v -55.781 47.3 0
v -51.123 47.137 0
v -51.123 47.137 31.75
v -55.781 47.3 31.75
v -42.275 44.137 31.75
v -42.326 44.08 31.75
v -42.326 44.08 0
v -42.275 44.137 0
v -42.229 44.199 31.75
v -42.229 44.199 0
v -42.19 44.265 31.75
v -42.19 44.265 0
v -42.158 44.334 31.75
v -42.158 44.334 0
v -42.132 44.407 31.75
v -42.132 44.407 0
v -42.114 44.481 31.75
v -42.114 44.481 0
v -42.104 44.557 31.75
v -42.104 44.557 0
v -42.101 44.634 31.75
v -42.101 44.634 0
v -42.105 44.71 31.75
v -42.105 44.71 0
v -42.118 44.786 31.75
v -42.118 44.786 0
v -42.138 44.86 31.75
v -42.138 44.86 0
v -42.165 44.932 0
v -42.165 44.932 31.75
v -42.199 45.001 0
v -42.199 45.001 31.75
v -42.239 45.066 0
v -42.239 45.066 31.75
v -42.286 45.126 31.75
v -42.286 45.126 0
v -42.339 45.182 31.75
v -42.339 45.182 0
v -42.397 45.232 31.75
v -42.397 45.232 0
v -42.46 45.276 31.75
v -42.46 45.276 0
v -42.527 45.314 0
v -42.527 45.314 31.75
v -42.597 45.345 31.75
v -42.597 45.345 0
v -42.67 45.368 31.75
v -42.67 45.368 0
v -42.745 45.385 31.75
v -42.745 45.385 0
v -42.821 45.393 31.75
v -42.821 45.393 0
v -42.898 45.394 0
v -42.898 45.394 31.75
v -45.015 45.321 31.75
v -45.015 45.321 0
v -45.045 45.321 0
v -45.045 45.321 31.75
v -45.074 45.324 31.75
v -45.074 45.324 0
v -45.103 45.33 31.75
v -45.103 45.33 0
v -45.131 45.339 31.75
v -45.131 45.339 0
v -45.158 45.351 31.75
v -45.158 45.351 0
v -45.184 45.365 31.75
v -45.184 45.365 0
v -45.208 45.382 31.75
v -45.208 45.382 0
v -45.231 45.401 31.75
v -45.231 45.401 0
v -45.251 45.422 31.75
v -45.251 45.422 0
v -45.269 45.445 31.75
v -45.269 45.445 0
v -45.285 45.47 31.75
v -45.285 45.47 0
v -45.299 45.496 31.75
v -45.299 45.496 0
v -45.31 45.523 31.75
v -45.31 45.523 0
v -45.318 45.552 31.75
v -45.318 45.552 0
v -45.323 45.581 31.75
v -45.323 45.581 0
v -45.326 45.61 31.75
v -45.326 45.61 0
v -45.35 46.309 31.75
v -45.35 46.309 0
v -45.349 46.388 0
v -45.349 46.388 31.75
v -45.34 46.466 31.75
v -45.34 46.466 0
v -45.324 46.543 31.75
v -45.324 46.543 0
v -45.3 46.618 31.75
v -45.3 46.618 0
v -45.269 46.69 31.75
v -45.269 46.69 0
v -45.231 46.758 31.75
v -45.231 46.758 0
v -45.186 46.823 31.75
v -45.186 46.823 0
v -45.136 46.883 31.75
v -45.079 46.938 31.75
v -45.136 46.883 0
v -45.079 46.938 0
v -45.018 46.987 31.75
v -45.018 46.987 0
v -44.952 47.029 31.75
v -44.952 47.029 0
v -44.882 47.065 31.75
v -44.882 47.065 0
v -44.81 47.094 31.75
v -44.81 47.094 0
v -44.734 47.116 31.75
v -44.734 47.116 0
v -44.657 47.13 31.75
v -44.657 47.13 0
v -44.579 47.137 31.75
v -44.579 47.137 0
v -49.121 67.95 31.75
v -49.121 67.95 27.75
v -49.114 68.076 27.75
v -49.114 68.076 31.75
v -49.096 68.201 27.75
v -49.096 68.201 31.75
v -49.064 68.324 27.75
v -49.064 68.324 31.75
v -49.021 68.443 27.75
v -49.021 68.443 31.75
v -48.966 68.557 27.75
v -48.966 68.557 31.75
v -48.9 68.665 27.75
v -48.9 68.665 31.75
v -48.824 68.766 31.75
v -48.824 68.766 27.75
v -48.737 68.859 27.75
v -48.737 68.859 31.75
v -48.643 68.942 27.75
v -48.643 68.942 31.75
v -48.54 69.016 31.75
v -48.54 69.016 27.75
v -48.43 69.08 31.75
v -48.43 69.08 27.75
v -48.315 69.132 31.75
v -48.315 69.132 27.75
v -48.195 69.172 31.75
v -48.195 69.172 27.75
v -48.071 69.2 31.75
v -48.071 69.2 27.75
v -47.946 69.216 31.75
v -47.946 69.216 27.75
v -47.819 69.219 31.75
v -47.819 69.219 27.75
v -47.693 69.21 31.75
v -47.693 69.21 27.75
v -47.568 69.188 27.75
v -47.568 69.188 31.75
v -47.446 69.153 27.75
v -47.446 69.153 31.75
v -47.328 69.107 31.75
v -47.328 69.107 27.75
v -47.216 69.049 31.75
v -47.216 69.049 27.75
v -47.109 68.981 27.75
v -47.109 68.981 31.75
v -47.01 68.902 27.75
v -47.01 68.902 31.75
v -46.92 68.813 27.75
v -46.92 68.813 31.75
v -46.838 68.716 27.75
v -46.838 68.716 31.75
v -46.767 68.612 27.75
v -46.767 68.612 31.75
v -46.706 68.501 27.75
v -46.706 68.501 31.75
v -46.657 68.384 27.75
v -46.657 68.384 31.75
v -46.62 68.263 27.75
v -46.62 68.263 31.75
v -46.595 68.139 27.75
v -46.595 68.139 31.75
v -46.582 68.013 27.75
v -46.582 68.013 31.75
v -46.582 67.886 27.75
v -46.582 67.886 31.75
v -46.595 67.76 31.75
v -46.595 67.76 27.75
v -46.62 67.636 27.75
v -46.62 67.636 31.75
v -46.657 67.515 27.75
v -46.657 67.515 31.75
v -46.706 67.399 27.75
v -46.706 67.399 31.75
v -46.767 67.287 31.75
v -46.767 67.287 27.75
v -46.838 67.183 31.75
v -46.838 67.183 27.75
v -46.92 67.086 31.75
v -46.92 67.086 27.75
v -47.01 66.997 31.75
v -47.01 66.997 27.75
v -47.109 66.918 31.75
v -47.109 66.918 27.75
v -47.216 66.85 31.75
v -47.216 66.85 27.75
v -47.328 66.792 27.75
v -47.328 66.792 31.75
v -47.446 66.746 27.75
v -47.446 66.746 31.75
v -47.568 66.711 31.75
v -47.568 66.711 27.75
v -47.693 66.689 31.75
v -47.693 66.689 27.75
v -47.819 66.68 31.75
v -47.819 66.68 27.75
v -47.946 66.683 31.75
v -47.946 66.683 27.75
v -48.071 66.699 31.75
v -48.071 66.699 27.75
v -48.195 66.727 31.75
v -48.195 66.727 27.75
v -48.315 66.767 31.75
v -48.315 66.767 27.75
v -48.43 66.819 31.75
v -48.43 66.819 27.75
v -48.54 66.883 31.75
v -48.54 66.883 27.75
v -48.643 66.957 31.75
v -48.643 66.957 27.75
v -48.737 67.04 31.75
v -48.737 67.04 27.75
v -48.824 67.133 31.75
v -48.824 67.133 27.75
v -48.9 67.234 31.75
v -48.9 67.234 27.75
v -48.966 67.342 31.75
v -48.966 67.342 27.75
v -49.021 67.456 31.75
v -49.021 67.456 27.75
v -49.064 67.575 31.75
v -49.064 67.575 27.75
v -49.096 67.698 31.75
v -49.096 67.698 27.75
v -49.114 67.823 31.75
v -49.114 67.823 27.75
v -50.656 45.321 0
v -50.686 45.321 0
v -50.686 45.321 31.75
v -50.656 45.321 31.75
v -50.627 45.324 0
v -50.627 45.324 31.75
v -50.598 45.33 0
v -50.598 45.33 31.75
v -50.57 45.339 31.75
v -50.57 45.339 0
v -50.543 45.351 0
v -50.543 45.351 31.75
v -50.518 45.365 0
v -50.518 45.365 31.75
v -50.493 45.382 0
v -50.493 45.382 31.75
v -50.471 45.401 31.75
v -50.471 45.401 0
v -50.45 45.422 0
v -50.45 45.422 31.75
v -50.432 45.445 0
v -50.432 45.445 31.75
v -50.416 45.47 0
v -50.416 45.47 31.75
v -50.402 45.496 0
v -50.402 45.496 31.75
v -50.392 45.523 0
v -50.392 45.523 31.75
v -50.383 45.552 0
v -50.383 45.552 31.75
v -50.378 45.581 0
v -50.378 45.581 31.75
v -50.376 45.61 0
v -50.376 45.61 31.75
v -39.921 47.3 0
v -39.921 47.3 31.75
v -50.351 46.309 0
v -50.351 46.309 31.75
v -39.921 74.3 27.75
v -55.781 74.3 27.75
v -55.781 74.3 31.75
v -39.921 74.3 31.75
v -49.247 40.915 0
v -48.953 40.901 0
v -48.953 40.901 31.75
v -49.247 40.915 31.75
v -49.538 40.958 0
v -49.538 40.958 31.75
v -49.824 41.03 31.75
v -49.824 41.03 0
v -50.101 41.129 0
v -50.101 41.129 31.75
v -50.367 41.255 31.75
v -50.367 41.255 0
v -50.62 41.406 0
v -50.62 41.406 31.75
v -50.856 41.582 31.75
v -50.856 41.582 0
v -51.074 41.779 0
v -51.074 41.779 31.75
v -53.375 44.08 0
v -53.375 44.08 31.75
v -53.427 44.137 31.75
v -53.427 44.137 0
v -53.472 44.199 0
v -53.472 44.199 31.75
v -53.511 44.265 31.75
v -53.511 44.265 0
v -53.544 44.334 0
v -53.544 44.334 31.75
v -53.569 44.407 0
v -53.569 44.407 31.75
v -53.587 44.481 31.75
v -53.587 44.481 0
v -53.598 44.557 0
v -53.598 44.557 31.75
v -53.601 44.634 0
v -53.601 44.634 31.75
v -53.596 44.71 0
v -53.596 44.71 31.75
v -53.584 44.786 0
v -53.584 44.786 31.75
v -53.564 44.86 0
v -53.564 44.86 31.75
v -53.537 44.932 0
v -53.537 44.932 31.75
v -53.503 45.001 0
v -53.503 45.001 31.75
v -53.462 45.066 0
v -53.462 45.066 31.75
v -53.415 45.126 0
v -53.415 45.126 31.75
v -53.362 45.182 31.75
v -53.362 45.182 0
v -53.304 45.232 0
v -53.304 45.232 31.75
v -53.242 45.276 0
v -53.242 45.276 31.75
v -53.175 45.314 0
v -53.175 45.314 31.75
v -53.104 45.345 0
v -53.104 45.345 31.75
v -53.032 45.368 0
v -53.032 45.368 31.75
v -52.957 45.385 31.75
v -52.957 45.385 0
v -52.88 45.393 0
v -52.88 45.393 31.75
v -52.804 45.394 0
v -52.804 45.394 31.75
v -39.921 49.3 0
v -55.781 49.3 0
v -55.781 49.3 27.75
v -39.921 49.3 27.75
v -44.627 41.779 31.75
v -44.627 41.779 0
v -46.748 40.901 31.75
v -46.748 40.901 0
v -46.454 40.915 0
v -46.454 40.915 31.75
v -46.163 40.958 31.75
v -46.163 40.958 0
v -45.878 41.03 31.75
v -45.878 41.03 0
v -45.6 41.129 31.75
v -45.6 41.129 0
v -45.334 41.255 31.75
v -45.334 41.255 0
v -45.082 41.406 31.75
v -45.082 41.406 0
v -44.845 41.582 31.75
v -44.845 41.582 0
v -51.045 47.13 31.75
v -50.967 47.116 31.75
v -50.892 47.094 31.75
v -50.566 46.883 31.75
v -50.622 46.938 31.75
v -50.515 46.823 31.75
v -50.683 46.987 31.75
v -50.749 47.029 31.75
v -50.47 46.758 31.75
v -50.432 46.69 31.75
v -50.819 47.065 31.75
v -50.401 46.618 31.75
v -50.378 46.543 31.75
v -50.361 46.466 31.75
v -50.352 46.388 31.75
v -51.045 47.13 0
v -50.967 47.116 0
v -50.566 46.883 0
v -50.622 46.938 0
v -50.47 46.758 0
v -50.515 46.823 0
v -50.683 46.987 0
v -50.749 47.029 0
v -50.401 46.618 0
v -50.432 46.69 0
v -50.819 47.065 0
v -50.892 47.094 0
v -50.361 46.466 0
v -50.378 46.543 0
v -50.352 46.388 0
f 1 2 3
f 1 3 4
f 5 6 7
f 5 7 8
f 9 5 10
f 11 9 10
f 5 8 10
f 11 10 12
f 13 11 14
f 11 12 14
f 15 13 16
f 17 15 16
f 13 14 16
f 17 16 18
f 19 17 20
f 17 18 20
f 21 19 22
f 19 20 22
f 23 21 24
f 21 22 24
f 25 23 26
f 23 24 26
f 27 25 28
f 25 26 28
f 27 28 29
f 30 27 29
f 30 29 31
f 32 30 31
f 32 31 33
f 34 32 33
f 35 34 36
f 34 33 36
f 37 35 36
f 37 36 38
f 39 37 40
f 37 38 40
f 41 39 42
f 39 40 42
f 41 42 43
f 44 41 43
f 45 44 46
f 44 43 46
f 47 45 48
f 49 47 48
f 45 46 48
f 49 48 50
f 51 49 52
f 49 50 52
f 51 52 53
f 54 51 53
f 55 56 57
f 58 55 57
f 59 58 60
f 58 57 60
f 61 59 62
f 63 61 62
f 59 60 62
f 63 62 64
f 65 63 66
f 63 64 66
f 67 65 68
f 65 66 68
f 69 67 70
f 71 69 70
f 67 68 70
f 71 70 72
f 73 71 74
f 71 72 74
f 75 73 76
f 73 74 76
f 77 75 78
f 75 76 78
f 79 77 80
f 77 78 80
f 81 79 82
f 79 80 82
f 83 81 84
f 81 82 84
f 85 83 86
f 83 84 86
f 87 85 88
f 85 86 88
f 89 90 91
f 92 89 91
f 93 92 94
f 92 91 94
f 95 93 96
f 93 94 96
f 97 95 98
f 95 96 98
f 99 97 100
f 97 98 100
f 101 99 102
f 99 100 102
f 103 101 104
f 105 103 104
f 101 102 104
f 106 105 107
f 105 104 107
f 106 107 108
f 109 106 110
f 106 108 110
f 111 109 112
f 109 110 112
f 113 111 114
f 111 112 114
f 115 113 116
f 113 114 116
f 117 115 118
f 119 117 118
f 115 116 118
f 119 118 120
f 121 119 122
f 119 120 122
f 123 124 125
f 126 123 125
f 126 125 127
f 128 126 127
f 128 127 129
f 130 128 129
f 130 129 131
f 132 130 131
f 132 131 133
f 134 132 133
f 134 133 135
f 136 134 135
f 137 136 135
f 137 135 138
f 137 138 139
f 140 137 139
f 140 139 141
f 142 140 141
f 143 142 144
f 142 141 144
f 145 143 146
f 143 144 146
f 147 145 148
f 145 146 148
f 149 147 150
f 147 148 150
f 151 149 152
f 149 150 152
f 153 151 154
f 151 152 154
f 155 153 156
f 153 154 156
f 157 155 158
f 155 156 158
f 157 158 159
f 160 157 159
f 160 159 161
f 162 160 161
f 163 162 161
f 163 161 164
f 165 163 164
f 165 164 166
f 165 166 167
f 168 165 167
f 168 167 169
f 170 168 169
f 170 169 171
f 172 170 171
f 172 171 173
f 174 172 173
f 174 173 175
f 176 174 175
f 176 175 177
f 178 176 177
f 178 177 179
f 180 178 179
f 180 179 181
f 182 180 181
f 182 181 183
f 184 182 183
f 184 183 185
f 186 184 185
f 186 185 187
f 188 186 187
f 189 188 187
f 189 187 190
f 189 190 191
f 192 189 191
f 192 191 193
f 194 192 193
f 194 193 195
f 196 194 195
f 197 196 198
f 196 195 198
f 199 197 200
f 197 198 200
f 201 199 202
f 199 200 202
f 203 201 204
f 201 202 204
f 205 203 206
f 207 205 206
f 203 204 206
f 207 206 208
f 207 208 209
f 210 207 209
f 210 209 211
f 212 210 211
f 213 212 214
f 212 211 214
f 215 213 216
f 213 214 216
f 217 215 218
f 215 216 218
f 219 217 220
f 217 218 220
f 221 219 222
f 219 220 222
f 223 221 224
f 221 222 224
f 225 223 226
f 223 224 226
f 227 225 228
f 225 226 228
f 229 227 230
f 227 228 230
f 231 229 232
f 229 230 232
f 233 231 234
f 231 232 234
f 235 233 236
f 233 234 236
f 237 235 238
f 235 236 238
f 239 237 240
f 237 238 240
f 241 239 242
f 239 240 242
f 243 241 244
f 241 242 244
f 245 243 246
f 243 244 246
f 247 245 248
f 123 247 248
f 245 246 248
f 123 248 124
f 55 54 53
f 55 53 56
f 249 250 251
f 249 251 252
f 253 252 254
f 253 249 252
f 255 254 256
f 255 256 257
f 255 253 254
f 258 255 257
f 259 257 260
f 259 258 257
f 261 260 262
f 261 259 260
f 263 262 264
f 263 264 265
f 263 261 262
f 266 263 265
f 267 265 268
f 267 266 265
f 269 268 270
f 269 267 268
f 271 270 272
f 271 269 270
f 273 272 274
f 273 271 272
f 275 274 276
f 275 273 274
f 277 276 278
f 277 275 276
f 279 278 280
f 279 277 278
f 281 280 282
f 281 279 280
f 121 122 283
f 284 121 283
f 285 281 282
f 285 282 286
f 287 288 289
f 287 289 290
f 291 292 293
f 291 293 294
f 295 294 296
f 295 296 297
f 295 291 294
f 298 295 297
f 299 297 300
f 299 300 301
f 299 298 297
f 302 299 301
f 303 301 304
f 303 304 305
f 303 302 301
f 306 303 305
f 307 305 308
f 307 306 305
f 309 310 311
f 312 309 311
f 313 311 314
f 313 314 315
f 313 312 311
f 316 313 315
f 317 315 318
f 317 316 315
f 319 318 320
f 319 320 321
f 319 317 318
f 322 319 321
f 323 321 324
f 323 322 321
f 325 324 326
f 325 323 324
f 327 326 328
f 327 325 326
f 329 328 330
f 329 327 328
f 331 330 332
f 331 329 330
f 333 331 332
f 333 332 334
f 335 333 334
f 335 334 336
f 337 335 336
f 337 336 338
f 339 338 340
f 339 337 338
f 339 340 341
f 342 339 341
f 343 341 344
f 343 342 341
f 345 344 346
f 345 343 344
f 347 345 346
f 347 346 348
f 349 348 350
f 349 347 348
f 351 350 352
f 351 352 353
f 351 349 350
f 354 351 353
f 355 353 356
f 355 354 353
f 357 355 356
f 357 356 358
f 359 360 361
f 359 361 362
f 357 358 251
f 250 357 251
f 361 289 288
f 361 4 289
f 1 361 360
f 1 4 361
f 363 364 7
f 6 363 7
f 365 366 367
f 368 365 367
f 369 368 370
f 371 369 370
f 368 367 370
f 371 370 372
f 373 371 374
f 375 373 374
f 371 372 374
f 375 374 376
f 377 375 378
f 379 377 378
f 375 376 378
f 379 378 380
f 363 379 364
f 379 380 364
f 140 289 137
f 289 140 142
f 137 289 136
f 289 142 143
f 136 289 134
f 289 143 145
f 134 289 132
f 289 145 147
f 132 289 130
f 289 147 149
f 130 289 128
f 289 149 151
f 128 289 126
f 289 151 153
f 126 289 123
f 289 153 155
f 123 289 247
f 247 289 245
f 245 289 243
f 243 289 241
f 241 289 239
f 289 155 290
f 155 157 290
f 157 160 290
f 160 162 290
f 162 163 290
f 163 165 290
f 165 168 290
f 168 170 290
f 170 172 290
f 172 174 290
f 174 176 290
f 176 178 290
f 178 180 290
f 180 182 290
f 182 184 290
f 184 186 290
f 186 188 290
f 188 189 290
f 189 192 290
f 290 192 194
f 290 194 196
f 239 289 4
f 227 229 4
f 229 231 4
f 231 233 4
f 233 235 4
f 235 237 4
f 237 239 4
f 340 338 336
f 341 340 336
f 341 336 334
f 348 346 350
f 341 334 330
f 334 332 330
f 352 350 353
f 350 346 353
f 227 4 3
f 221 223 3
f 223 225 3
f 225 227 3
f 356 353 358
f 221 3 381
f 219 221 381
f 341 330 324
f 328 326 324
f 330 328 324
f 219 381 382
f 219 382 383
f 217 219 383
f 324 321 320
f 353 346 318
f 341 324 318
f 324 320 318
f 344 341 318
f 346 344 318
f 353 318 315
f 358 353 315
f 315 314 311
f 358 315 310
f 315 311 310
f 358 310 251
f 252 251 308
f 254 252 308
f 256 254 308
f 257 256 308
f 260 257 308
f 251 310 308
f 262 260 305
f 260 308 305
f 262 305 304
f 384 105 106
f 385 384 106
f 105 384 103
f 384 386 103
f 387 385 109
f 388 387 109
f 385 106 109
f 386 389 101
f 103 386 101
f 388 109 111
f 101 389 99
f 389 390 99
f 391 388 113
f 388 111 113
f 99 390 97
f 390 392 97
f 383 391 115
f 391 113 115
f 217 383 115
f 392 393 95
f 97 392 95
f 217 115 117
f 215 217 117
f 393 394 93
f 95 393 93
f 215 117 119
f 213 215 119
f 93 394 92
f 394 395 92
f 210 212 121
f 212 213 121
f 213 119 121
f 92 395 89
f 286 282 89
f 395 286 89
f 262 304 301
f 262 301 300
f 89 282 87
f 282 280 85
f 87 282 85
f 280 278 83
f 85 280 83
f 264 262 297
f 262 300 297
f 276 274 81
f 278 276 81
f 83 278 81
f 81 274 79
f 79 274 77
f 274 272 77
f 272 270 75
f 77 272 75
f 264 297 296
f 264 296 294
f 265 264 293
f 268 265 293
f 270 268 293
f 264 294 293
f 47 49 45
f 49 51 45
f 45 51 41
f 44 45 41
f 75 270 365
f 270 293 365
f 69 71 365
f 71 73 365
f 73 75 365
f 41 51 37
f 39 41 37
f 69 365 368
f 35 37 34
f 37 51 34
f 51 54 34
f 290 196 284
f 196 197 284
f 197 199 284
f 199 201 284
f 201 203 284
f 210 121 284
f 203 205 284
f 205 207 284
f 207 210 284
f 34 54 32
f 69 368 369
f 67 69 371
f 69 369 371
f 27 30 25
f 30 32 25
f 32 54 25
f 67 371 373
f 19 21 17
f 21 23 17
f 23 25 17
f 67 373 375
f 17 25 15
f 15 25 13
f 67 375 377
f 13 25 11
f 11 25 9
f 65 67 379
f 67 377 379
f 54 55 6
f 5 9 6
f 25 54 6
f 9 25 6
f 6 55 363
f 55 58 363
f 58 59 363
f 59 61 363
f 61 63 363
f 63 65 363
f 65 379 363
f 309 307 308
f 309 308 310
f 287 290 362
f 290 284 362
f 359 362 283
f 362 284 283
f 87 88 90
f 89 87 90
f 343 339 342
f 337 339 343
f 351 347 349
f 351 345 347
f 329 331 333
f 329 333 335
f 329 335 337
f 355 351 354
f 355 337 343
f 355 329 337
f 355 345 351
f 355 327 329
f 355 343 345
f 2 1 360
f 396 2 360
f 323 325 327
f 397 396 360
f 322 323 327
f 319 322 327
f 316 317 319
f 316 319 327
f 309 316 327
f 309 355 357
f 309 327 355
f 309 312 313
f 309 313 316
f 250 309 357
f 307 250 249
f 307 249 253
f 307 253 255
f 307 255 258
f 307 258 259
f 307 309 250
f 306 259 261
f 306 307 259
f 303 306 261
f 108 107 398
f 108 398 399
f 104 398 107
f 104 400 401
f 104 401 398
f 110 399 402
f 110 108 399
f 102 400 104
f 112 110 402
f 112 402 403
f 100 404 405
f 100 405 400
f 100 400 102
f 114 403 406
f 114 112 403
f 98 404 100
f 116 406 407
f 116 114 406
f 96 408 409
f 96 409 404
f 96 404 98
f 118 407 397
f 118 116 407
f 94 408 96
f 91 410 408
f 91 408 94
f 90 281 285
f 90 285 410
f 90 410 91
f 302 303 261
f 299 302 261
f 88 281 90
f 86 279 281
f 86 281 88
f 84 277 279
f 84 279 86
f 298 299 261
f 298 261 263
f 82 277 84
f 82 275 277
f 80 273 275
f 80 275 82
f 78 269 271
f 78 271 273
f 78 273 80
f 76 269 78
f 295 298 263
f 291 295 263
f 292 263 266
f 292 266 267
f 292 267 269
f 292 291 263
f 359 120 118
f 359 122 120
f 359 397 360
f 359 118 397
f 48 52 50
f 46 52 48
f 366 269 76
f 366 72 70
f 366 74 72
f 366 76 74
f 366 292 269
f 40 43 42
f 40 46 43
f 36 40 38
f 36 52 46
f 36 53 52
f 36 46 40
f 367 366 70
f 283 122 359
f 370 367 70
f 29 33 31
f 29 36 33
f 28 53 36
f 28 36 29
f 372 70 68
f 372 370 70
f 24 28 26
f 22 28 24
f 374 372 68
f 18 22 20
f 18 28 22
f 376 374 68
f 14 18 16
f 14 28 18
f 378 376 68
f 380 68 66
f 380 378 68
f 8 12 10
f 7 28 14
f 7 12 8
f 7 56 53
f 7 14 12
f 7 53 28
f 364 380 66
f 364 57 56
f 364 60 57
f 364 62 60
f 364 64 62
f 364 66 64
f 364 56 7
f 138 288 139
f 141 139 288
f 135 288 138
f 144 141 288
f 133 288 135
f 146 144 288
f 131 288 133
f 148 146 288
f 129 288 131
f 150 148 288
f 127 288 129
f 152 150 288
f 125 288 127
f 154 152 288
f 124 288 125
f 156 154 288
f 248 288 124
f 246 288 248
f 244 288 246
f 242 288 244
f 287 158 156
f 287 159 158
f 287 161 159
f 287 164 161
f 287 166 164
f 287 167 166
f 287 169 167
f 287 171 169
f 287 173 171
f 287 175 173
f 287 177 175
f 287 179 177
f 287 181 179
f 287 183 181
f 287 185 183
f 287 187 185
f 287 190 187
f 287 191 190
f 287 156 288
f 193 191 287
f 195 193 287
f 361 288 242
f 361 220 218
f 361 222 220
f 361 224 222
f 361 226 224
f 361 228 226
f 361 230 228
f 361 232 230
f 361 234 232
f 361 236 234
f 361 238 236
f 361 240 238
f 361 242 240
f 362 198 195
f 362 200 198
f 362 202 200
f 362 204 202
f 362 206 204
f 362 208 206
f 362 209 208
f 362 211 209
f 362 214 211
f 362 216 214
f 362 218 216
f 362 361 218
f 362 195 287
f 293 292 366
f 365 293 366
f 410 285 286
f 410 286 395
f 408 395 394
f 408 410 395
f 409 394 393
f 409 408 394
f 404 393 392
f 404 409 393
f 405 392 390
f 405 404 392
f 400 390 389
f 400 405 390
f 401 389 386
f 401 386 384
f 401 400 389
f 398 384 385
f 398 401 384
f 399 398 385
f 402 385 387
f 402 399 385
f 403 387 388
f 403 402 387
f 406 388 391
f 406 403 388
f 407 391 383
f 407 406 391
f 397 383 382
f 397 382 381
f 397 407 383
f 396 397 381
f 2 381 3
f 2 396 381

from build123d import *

# Parameters (mm, degrees)
BOSS_EXTRUDE1_DEPTH = 31.75
SKETCH19_W          = 15.860402013
SKETCH19_H          = 31.75
BOSS_EXTRUDE7_DEPTH = 2
SKETCH23_W          = 15.860402013
SKETCH23_H          = 4
BOSS_EXTRUDE8_DEPTH = 25
SKETCH24_R          = 1.27
CUT_EXTRUDE1_DEPTH  = 5


with BuildPart() as part:
    # Sketch2 → Boss-Extrude1 (new body)
    with BuildSketch(Plane.XY):
        with BuildLine():
            Line((-50.375618534, 45.609862895), (-50.351188886, 46.309436474))
            ThreePointArc((-50.351188886, 46.309436474), (-50.565618587, 46.88295476), (-51.12278195, 47.136868733))
            Line((-51.12278195, 47.136868733), (-55.780902554, 47.299533889))
            Line((-55.780902554, 47.299533889), (-47.850701548, 47.299533889))
            Line((-47.850701548, 47.299533889), (-47.850701548, 40.900752235))
            Line((-47.850701548, 40.900752235), (-48.952946324, 40.900752235))
            ThreePointArc((-48.952946324, 40.900752235), (-50.100996621, 41.129113637), (-51.074266668, 41.779431891))
            Line((-51.074266668, 41.779431891), (-53.375146928, 44.080312152))
            ThreePointArc((-53.375146928, 44.080312152), (-53.536830204, 44.931922499), (-52.803734096, 45.394471696))
            Line((-52.803734096, 45.394471696), (-50.685905631, 45.320515496))
            ThreePointArc((-50.685905631, 45.320515496), (-50.470836274, 45.400926634), (-50.375618534, 45.609862895))
        make_face()
    boss_extrude1 = extrude(amount=BOSS_EXTRUDE1_DEPTH)

    # Mirror2: Boss-Extrude1 across plane
    add(boss_extrude1.mirror(Plane(origin=(-47.850701548, 40.900752235, 31.75), x_dir=(0, 0, 1), z_dir=(-1, 0, 0))))

    # Sketch19 → Boss-Extrude7 (add)
    with BuildSketch(Plane(origin=(0, 47.299533889, 0), x_dir=(1, 0, 0), z_dir=(0, 1, 0))):
        with Locations((-47.850701548, -15.875)):
            Rectangle(SKETCH19_W, SKETCH19_H)
    extrude(amount=BOSS_EXTRUDE7_DEPTH)

    # Sketch23 → Boss-Extrude8 (add)
    with BuildSketch(Plane(origin=(0, 49.299533889, 0), x_dir=(1, 0, 0), z_dir=(0, 1, 0))):
        with Locations((-47.850701548, -29.75)):
            Rectangle(SKETCH23_W, SKETCH23_H)
    extrude(amount=BOSS_EXTRUDE8_DEPTH)

    # Sketch24 → Cut-Extrude1 (cut, through all)
    with BuildSketch(Plane(origin=(0, 0, 27.75), x_dir=(-1, 0, 0), z_dir=(0, 0, -1))):
        with Locations((47.850701548, 67.949533889)):
            Circle(SKETCH24_R)
    extrude(amount=-CUT_EXTRUDE1_DEPTH, mode=Mode.SUBTRACT)


solid = part.part
